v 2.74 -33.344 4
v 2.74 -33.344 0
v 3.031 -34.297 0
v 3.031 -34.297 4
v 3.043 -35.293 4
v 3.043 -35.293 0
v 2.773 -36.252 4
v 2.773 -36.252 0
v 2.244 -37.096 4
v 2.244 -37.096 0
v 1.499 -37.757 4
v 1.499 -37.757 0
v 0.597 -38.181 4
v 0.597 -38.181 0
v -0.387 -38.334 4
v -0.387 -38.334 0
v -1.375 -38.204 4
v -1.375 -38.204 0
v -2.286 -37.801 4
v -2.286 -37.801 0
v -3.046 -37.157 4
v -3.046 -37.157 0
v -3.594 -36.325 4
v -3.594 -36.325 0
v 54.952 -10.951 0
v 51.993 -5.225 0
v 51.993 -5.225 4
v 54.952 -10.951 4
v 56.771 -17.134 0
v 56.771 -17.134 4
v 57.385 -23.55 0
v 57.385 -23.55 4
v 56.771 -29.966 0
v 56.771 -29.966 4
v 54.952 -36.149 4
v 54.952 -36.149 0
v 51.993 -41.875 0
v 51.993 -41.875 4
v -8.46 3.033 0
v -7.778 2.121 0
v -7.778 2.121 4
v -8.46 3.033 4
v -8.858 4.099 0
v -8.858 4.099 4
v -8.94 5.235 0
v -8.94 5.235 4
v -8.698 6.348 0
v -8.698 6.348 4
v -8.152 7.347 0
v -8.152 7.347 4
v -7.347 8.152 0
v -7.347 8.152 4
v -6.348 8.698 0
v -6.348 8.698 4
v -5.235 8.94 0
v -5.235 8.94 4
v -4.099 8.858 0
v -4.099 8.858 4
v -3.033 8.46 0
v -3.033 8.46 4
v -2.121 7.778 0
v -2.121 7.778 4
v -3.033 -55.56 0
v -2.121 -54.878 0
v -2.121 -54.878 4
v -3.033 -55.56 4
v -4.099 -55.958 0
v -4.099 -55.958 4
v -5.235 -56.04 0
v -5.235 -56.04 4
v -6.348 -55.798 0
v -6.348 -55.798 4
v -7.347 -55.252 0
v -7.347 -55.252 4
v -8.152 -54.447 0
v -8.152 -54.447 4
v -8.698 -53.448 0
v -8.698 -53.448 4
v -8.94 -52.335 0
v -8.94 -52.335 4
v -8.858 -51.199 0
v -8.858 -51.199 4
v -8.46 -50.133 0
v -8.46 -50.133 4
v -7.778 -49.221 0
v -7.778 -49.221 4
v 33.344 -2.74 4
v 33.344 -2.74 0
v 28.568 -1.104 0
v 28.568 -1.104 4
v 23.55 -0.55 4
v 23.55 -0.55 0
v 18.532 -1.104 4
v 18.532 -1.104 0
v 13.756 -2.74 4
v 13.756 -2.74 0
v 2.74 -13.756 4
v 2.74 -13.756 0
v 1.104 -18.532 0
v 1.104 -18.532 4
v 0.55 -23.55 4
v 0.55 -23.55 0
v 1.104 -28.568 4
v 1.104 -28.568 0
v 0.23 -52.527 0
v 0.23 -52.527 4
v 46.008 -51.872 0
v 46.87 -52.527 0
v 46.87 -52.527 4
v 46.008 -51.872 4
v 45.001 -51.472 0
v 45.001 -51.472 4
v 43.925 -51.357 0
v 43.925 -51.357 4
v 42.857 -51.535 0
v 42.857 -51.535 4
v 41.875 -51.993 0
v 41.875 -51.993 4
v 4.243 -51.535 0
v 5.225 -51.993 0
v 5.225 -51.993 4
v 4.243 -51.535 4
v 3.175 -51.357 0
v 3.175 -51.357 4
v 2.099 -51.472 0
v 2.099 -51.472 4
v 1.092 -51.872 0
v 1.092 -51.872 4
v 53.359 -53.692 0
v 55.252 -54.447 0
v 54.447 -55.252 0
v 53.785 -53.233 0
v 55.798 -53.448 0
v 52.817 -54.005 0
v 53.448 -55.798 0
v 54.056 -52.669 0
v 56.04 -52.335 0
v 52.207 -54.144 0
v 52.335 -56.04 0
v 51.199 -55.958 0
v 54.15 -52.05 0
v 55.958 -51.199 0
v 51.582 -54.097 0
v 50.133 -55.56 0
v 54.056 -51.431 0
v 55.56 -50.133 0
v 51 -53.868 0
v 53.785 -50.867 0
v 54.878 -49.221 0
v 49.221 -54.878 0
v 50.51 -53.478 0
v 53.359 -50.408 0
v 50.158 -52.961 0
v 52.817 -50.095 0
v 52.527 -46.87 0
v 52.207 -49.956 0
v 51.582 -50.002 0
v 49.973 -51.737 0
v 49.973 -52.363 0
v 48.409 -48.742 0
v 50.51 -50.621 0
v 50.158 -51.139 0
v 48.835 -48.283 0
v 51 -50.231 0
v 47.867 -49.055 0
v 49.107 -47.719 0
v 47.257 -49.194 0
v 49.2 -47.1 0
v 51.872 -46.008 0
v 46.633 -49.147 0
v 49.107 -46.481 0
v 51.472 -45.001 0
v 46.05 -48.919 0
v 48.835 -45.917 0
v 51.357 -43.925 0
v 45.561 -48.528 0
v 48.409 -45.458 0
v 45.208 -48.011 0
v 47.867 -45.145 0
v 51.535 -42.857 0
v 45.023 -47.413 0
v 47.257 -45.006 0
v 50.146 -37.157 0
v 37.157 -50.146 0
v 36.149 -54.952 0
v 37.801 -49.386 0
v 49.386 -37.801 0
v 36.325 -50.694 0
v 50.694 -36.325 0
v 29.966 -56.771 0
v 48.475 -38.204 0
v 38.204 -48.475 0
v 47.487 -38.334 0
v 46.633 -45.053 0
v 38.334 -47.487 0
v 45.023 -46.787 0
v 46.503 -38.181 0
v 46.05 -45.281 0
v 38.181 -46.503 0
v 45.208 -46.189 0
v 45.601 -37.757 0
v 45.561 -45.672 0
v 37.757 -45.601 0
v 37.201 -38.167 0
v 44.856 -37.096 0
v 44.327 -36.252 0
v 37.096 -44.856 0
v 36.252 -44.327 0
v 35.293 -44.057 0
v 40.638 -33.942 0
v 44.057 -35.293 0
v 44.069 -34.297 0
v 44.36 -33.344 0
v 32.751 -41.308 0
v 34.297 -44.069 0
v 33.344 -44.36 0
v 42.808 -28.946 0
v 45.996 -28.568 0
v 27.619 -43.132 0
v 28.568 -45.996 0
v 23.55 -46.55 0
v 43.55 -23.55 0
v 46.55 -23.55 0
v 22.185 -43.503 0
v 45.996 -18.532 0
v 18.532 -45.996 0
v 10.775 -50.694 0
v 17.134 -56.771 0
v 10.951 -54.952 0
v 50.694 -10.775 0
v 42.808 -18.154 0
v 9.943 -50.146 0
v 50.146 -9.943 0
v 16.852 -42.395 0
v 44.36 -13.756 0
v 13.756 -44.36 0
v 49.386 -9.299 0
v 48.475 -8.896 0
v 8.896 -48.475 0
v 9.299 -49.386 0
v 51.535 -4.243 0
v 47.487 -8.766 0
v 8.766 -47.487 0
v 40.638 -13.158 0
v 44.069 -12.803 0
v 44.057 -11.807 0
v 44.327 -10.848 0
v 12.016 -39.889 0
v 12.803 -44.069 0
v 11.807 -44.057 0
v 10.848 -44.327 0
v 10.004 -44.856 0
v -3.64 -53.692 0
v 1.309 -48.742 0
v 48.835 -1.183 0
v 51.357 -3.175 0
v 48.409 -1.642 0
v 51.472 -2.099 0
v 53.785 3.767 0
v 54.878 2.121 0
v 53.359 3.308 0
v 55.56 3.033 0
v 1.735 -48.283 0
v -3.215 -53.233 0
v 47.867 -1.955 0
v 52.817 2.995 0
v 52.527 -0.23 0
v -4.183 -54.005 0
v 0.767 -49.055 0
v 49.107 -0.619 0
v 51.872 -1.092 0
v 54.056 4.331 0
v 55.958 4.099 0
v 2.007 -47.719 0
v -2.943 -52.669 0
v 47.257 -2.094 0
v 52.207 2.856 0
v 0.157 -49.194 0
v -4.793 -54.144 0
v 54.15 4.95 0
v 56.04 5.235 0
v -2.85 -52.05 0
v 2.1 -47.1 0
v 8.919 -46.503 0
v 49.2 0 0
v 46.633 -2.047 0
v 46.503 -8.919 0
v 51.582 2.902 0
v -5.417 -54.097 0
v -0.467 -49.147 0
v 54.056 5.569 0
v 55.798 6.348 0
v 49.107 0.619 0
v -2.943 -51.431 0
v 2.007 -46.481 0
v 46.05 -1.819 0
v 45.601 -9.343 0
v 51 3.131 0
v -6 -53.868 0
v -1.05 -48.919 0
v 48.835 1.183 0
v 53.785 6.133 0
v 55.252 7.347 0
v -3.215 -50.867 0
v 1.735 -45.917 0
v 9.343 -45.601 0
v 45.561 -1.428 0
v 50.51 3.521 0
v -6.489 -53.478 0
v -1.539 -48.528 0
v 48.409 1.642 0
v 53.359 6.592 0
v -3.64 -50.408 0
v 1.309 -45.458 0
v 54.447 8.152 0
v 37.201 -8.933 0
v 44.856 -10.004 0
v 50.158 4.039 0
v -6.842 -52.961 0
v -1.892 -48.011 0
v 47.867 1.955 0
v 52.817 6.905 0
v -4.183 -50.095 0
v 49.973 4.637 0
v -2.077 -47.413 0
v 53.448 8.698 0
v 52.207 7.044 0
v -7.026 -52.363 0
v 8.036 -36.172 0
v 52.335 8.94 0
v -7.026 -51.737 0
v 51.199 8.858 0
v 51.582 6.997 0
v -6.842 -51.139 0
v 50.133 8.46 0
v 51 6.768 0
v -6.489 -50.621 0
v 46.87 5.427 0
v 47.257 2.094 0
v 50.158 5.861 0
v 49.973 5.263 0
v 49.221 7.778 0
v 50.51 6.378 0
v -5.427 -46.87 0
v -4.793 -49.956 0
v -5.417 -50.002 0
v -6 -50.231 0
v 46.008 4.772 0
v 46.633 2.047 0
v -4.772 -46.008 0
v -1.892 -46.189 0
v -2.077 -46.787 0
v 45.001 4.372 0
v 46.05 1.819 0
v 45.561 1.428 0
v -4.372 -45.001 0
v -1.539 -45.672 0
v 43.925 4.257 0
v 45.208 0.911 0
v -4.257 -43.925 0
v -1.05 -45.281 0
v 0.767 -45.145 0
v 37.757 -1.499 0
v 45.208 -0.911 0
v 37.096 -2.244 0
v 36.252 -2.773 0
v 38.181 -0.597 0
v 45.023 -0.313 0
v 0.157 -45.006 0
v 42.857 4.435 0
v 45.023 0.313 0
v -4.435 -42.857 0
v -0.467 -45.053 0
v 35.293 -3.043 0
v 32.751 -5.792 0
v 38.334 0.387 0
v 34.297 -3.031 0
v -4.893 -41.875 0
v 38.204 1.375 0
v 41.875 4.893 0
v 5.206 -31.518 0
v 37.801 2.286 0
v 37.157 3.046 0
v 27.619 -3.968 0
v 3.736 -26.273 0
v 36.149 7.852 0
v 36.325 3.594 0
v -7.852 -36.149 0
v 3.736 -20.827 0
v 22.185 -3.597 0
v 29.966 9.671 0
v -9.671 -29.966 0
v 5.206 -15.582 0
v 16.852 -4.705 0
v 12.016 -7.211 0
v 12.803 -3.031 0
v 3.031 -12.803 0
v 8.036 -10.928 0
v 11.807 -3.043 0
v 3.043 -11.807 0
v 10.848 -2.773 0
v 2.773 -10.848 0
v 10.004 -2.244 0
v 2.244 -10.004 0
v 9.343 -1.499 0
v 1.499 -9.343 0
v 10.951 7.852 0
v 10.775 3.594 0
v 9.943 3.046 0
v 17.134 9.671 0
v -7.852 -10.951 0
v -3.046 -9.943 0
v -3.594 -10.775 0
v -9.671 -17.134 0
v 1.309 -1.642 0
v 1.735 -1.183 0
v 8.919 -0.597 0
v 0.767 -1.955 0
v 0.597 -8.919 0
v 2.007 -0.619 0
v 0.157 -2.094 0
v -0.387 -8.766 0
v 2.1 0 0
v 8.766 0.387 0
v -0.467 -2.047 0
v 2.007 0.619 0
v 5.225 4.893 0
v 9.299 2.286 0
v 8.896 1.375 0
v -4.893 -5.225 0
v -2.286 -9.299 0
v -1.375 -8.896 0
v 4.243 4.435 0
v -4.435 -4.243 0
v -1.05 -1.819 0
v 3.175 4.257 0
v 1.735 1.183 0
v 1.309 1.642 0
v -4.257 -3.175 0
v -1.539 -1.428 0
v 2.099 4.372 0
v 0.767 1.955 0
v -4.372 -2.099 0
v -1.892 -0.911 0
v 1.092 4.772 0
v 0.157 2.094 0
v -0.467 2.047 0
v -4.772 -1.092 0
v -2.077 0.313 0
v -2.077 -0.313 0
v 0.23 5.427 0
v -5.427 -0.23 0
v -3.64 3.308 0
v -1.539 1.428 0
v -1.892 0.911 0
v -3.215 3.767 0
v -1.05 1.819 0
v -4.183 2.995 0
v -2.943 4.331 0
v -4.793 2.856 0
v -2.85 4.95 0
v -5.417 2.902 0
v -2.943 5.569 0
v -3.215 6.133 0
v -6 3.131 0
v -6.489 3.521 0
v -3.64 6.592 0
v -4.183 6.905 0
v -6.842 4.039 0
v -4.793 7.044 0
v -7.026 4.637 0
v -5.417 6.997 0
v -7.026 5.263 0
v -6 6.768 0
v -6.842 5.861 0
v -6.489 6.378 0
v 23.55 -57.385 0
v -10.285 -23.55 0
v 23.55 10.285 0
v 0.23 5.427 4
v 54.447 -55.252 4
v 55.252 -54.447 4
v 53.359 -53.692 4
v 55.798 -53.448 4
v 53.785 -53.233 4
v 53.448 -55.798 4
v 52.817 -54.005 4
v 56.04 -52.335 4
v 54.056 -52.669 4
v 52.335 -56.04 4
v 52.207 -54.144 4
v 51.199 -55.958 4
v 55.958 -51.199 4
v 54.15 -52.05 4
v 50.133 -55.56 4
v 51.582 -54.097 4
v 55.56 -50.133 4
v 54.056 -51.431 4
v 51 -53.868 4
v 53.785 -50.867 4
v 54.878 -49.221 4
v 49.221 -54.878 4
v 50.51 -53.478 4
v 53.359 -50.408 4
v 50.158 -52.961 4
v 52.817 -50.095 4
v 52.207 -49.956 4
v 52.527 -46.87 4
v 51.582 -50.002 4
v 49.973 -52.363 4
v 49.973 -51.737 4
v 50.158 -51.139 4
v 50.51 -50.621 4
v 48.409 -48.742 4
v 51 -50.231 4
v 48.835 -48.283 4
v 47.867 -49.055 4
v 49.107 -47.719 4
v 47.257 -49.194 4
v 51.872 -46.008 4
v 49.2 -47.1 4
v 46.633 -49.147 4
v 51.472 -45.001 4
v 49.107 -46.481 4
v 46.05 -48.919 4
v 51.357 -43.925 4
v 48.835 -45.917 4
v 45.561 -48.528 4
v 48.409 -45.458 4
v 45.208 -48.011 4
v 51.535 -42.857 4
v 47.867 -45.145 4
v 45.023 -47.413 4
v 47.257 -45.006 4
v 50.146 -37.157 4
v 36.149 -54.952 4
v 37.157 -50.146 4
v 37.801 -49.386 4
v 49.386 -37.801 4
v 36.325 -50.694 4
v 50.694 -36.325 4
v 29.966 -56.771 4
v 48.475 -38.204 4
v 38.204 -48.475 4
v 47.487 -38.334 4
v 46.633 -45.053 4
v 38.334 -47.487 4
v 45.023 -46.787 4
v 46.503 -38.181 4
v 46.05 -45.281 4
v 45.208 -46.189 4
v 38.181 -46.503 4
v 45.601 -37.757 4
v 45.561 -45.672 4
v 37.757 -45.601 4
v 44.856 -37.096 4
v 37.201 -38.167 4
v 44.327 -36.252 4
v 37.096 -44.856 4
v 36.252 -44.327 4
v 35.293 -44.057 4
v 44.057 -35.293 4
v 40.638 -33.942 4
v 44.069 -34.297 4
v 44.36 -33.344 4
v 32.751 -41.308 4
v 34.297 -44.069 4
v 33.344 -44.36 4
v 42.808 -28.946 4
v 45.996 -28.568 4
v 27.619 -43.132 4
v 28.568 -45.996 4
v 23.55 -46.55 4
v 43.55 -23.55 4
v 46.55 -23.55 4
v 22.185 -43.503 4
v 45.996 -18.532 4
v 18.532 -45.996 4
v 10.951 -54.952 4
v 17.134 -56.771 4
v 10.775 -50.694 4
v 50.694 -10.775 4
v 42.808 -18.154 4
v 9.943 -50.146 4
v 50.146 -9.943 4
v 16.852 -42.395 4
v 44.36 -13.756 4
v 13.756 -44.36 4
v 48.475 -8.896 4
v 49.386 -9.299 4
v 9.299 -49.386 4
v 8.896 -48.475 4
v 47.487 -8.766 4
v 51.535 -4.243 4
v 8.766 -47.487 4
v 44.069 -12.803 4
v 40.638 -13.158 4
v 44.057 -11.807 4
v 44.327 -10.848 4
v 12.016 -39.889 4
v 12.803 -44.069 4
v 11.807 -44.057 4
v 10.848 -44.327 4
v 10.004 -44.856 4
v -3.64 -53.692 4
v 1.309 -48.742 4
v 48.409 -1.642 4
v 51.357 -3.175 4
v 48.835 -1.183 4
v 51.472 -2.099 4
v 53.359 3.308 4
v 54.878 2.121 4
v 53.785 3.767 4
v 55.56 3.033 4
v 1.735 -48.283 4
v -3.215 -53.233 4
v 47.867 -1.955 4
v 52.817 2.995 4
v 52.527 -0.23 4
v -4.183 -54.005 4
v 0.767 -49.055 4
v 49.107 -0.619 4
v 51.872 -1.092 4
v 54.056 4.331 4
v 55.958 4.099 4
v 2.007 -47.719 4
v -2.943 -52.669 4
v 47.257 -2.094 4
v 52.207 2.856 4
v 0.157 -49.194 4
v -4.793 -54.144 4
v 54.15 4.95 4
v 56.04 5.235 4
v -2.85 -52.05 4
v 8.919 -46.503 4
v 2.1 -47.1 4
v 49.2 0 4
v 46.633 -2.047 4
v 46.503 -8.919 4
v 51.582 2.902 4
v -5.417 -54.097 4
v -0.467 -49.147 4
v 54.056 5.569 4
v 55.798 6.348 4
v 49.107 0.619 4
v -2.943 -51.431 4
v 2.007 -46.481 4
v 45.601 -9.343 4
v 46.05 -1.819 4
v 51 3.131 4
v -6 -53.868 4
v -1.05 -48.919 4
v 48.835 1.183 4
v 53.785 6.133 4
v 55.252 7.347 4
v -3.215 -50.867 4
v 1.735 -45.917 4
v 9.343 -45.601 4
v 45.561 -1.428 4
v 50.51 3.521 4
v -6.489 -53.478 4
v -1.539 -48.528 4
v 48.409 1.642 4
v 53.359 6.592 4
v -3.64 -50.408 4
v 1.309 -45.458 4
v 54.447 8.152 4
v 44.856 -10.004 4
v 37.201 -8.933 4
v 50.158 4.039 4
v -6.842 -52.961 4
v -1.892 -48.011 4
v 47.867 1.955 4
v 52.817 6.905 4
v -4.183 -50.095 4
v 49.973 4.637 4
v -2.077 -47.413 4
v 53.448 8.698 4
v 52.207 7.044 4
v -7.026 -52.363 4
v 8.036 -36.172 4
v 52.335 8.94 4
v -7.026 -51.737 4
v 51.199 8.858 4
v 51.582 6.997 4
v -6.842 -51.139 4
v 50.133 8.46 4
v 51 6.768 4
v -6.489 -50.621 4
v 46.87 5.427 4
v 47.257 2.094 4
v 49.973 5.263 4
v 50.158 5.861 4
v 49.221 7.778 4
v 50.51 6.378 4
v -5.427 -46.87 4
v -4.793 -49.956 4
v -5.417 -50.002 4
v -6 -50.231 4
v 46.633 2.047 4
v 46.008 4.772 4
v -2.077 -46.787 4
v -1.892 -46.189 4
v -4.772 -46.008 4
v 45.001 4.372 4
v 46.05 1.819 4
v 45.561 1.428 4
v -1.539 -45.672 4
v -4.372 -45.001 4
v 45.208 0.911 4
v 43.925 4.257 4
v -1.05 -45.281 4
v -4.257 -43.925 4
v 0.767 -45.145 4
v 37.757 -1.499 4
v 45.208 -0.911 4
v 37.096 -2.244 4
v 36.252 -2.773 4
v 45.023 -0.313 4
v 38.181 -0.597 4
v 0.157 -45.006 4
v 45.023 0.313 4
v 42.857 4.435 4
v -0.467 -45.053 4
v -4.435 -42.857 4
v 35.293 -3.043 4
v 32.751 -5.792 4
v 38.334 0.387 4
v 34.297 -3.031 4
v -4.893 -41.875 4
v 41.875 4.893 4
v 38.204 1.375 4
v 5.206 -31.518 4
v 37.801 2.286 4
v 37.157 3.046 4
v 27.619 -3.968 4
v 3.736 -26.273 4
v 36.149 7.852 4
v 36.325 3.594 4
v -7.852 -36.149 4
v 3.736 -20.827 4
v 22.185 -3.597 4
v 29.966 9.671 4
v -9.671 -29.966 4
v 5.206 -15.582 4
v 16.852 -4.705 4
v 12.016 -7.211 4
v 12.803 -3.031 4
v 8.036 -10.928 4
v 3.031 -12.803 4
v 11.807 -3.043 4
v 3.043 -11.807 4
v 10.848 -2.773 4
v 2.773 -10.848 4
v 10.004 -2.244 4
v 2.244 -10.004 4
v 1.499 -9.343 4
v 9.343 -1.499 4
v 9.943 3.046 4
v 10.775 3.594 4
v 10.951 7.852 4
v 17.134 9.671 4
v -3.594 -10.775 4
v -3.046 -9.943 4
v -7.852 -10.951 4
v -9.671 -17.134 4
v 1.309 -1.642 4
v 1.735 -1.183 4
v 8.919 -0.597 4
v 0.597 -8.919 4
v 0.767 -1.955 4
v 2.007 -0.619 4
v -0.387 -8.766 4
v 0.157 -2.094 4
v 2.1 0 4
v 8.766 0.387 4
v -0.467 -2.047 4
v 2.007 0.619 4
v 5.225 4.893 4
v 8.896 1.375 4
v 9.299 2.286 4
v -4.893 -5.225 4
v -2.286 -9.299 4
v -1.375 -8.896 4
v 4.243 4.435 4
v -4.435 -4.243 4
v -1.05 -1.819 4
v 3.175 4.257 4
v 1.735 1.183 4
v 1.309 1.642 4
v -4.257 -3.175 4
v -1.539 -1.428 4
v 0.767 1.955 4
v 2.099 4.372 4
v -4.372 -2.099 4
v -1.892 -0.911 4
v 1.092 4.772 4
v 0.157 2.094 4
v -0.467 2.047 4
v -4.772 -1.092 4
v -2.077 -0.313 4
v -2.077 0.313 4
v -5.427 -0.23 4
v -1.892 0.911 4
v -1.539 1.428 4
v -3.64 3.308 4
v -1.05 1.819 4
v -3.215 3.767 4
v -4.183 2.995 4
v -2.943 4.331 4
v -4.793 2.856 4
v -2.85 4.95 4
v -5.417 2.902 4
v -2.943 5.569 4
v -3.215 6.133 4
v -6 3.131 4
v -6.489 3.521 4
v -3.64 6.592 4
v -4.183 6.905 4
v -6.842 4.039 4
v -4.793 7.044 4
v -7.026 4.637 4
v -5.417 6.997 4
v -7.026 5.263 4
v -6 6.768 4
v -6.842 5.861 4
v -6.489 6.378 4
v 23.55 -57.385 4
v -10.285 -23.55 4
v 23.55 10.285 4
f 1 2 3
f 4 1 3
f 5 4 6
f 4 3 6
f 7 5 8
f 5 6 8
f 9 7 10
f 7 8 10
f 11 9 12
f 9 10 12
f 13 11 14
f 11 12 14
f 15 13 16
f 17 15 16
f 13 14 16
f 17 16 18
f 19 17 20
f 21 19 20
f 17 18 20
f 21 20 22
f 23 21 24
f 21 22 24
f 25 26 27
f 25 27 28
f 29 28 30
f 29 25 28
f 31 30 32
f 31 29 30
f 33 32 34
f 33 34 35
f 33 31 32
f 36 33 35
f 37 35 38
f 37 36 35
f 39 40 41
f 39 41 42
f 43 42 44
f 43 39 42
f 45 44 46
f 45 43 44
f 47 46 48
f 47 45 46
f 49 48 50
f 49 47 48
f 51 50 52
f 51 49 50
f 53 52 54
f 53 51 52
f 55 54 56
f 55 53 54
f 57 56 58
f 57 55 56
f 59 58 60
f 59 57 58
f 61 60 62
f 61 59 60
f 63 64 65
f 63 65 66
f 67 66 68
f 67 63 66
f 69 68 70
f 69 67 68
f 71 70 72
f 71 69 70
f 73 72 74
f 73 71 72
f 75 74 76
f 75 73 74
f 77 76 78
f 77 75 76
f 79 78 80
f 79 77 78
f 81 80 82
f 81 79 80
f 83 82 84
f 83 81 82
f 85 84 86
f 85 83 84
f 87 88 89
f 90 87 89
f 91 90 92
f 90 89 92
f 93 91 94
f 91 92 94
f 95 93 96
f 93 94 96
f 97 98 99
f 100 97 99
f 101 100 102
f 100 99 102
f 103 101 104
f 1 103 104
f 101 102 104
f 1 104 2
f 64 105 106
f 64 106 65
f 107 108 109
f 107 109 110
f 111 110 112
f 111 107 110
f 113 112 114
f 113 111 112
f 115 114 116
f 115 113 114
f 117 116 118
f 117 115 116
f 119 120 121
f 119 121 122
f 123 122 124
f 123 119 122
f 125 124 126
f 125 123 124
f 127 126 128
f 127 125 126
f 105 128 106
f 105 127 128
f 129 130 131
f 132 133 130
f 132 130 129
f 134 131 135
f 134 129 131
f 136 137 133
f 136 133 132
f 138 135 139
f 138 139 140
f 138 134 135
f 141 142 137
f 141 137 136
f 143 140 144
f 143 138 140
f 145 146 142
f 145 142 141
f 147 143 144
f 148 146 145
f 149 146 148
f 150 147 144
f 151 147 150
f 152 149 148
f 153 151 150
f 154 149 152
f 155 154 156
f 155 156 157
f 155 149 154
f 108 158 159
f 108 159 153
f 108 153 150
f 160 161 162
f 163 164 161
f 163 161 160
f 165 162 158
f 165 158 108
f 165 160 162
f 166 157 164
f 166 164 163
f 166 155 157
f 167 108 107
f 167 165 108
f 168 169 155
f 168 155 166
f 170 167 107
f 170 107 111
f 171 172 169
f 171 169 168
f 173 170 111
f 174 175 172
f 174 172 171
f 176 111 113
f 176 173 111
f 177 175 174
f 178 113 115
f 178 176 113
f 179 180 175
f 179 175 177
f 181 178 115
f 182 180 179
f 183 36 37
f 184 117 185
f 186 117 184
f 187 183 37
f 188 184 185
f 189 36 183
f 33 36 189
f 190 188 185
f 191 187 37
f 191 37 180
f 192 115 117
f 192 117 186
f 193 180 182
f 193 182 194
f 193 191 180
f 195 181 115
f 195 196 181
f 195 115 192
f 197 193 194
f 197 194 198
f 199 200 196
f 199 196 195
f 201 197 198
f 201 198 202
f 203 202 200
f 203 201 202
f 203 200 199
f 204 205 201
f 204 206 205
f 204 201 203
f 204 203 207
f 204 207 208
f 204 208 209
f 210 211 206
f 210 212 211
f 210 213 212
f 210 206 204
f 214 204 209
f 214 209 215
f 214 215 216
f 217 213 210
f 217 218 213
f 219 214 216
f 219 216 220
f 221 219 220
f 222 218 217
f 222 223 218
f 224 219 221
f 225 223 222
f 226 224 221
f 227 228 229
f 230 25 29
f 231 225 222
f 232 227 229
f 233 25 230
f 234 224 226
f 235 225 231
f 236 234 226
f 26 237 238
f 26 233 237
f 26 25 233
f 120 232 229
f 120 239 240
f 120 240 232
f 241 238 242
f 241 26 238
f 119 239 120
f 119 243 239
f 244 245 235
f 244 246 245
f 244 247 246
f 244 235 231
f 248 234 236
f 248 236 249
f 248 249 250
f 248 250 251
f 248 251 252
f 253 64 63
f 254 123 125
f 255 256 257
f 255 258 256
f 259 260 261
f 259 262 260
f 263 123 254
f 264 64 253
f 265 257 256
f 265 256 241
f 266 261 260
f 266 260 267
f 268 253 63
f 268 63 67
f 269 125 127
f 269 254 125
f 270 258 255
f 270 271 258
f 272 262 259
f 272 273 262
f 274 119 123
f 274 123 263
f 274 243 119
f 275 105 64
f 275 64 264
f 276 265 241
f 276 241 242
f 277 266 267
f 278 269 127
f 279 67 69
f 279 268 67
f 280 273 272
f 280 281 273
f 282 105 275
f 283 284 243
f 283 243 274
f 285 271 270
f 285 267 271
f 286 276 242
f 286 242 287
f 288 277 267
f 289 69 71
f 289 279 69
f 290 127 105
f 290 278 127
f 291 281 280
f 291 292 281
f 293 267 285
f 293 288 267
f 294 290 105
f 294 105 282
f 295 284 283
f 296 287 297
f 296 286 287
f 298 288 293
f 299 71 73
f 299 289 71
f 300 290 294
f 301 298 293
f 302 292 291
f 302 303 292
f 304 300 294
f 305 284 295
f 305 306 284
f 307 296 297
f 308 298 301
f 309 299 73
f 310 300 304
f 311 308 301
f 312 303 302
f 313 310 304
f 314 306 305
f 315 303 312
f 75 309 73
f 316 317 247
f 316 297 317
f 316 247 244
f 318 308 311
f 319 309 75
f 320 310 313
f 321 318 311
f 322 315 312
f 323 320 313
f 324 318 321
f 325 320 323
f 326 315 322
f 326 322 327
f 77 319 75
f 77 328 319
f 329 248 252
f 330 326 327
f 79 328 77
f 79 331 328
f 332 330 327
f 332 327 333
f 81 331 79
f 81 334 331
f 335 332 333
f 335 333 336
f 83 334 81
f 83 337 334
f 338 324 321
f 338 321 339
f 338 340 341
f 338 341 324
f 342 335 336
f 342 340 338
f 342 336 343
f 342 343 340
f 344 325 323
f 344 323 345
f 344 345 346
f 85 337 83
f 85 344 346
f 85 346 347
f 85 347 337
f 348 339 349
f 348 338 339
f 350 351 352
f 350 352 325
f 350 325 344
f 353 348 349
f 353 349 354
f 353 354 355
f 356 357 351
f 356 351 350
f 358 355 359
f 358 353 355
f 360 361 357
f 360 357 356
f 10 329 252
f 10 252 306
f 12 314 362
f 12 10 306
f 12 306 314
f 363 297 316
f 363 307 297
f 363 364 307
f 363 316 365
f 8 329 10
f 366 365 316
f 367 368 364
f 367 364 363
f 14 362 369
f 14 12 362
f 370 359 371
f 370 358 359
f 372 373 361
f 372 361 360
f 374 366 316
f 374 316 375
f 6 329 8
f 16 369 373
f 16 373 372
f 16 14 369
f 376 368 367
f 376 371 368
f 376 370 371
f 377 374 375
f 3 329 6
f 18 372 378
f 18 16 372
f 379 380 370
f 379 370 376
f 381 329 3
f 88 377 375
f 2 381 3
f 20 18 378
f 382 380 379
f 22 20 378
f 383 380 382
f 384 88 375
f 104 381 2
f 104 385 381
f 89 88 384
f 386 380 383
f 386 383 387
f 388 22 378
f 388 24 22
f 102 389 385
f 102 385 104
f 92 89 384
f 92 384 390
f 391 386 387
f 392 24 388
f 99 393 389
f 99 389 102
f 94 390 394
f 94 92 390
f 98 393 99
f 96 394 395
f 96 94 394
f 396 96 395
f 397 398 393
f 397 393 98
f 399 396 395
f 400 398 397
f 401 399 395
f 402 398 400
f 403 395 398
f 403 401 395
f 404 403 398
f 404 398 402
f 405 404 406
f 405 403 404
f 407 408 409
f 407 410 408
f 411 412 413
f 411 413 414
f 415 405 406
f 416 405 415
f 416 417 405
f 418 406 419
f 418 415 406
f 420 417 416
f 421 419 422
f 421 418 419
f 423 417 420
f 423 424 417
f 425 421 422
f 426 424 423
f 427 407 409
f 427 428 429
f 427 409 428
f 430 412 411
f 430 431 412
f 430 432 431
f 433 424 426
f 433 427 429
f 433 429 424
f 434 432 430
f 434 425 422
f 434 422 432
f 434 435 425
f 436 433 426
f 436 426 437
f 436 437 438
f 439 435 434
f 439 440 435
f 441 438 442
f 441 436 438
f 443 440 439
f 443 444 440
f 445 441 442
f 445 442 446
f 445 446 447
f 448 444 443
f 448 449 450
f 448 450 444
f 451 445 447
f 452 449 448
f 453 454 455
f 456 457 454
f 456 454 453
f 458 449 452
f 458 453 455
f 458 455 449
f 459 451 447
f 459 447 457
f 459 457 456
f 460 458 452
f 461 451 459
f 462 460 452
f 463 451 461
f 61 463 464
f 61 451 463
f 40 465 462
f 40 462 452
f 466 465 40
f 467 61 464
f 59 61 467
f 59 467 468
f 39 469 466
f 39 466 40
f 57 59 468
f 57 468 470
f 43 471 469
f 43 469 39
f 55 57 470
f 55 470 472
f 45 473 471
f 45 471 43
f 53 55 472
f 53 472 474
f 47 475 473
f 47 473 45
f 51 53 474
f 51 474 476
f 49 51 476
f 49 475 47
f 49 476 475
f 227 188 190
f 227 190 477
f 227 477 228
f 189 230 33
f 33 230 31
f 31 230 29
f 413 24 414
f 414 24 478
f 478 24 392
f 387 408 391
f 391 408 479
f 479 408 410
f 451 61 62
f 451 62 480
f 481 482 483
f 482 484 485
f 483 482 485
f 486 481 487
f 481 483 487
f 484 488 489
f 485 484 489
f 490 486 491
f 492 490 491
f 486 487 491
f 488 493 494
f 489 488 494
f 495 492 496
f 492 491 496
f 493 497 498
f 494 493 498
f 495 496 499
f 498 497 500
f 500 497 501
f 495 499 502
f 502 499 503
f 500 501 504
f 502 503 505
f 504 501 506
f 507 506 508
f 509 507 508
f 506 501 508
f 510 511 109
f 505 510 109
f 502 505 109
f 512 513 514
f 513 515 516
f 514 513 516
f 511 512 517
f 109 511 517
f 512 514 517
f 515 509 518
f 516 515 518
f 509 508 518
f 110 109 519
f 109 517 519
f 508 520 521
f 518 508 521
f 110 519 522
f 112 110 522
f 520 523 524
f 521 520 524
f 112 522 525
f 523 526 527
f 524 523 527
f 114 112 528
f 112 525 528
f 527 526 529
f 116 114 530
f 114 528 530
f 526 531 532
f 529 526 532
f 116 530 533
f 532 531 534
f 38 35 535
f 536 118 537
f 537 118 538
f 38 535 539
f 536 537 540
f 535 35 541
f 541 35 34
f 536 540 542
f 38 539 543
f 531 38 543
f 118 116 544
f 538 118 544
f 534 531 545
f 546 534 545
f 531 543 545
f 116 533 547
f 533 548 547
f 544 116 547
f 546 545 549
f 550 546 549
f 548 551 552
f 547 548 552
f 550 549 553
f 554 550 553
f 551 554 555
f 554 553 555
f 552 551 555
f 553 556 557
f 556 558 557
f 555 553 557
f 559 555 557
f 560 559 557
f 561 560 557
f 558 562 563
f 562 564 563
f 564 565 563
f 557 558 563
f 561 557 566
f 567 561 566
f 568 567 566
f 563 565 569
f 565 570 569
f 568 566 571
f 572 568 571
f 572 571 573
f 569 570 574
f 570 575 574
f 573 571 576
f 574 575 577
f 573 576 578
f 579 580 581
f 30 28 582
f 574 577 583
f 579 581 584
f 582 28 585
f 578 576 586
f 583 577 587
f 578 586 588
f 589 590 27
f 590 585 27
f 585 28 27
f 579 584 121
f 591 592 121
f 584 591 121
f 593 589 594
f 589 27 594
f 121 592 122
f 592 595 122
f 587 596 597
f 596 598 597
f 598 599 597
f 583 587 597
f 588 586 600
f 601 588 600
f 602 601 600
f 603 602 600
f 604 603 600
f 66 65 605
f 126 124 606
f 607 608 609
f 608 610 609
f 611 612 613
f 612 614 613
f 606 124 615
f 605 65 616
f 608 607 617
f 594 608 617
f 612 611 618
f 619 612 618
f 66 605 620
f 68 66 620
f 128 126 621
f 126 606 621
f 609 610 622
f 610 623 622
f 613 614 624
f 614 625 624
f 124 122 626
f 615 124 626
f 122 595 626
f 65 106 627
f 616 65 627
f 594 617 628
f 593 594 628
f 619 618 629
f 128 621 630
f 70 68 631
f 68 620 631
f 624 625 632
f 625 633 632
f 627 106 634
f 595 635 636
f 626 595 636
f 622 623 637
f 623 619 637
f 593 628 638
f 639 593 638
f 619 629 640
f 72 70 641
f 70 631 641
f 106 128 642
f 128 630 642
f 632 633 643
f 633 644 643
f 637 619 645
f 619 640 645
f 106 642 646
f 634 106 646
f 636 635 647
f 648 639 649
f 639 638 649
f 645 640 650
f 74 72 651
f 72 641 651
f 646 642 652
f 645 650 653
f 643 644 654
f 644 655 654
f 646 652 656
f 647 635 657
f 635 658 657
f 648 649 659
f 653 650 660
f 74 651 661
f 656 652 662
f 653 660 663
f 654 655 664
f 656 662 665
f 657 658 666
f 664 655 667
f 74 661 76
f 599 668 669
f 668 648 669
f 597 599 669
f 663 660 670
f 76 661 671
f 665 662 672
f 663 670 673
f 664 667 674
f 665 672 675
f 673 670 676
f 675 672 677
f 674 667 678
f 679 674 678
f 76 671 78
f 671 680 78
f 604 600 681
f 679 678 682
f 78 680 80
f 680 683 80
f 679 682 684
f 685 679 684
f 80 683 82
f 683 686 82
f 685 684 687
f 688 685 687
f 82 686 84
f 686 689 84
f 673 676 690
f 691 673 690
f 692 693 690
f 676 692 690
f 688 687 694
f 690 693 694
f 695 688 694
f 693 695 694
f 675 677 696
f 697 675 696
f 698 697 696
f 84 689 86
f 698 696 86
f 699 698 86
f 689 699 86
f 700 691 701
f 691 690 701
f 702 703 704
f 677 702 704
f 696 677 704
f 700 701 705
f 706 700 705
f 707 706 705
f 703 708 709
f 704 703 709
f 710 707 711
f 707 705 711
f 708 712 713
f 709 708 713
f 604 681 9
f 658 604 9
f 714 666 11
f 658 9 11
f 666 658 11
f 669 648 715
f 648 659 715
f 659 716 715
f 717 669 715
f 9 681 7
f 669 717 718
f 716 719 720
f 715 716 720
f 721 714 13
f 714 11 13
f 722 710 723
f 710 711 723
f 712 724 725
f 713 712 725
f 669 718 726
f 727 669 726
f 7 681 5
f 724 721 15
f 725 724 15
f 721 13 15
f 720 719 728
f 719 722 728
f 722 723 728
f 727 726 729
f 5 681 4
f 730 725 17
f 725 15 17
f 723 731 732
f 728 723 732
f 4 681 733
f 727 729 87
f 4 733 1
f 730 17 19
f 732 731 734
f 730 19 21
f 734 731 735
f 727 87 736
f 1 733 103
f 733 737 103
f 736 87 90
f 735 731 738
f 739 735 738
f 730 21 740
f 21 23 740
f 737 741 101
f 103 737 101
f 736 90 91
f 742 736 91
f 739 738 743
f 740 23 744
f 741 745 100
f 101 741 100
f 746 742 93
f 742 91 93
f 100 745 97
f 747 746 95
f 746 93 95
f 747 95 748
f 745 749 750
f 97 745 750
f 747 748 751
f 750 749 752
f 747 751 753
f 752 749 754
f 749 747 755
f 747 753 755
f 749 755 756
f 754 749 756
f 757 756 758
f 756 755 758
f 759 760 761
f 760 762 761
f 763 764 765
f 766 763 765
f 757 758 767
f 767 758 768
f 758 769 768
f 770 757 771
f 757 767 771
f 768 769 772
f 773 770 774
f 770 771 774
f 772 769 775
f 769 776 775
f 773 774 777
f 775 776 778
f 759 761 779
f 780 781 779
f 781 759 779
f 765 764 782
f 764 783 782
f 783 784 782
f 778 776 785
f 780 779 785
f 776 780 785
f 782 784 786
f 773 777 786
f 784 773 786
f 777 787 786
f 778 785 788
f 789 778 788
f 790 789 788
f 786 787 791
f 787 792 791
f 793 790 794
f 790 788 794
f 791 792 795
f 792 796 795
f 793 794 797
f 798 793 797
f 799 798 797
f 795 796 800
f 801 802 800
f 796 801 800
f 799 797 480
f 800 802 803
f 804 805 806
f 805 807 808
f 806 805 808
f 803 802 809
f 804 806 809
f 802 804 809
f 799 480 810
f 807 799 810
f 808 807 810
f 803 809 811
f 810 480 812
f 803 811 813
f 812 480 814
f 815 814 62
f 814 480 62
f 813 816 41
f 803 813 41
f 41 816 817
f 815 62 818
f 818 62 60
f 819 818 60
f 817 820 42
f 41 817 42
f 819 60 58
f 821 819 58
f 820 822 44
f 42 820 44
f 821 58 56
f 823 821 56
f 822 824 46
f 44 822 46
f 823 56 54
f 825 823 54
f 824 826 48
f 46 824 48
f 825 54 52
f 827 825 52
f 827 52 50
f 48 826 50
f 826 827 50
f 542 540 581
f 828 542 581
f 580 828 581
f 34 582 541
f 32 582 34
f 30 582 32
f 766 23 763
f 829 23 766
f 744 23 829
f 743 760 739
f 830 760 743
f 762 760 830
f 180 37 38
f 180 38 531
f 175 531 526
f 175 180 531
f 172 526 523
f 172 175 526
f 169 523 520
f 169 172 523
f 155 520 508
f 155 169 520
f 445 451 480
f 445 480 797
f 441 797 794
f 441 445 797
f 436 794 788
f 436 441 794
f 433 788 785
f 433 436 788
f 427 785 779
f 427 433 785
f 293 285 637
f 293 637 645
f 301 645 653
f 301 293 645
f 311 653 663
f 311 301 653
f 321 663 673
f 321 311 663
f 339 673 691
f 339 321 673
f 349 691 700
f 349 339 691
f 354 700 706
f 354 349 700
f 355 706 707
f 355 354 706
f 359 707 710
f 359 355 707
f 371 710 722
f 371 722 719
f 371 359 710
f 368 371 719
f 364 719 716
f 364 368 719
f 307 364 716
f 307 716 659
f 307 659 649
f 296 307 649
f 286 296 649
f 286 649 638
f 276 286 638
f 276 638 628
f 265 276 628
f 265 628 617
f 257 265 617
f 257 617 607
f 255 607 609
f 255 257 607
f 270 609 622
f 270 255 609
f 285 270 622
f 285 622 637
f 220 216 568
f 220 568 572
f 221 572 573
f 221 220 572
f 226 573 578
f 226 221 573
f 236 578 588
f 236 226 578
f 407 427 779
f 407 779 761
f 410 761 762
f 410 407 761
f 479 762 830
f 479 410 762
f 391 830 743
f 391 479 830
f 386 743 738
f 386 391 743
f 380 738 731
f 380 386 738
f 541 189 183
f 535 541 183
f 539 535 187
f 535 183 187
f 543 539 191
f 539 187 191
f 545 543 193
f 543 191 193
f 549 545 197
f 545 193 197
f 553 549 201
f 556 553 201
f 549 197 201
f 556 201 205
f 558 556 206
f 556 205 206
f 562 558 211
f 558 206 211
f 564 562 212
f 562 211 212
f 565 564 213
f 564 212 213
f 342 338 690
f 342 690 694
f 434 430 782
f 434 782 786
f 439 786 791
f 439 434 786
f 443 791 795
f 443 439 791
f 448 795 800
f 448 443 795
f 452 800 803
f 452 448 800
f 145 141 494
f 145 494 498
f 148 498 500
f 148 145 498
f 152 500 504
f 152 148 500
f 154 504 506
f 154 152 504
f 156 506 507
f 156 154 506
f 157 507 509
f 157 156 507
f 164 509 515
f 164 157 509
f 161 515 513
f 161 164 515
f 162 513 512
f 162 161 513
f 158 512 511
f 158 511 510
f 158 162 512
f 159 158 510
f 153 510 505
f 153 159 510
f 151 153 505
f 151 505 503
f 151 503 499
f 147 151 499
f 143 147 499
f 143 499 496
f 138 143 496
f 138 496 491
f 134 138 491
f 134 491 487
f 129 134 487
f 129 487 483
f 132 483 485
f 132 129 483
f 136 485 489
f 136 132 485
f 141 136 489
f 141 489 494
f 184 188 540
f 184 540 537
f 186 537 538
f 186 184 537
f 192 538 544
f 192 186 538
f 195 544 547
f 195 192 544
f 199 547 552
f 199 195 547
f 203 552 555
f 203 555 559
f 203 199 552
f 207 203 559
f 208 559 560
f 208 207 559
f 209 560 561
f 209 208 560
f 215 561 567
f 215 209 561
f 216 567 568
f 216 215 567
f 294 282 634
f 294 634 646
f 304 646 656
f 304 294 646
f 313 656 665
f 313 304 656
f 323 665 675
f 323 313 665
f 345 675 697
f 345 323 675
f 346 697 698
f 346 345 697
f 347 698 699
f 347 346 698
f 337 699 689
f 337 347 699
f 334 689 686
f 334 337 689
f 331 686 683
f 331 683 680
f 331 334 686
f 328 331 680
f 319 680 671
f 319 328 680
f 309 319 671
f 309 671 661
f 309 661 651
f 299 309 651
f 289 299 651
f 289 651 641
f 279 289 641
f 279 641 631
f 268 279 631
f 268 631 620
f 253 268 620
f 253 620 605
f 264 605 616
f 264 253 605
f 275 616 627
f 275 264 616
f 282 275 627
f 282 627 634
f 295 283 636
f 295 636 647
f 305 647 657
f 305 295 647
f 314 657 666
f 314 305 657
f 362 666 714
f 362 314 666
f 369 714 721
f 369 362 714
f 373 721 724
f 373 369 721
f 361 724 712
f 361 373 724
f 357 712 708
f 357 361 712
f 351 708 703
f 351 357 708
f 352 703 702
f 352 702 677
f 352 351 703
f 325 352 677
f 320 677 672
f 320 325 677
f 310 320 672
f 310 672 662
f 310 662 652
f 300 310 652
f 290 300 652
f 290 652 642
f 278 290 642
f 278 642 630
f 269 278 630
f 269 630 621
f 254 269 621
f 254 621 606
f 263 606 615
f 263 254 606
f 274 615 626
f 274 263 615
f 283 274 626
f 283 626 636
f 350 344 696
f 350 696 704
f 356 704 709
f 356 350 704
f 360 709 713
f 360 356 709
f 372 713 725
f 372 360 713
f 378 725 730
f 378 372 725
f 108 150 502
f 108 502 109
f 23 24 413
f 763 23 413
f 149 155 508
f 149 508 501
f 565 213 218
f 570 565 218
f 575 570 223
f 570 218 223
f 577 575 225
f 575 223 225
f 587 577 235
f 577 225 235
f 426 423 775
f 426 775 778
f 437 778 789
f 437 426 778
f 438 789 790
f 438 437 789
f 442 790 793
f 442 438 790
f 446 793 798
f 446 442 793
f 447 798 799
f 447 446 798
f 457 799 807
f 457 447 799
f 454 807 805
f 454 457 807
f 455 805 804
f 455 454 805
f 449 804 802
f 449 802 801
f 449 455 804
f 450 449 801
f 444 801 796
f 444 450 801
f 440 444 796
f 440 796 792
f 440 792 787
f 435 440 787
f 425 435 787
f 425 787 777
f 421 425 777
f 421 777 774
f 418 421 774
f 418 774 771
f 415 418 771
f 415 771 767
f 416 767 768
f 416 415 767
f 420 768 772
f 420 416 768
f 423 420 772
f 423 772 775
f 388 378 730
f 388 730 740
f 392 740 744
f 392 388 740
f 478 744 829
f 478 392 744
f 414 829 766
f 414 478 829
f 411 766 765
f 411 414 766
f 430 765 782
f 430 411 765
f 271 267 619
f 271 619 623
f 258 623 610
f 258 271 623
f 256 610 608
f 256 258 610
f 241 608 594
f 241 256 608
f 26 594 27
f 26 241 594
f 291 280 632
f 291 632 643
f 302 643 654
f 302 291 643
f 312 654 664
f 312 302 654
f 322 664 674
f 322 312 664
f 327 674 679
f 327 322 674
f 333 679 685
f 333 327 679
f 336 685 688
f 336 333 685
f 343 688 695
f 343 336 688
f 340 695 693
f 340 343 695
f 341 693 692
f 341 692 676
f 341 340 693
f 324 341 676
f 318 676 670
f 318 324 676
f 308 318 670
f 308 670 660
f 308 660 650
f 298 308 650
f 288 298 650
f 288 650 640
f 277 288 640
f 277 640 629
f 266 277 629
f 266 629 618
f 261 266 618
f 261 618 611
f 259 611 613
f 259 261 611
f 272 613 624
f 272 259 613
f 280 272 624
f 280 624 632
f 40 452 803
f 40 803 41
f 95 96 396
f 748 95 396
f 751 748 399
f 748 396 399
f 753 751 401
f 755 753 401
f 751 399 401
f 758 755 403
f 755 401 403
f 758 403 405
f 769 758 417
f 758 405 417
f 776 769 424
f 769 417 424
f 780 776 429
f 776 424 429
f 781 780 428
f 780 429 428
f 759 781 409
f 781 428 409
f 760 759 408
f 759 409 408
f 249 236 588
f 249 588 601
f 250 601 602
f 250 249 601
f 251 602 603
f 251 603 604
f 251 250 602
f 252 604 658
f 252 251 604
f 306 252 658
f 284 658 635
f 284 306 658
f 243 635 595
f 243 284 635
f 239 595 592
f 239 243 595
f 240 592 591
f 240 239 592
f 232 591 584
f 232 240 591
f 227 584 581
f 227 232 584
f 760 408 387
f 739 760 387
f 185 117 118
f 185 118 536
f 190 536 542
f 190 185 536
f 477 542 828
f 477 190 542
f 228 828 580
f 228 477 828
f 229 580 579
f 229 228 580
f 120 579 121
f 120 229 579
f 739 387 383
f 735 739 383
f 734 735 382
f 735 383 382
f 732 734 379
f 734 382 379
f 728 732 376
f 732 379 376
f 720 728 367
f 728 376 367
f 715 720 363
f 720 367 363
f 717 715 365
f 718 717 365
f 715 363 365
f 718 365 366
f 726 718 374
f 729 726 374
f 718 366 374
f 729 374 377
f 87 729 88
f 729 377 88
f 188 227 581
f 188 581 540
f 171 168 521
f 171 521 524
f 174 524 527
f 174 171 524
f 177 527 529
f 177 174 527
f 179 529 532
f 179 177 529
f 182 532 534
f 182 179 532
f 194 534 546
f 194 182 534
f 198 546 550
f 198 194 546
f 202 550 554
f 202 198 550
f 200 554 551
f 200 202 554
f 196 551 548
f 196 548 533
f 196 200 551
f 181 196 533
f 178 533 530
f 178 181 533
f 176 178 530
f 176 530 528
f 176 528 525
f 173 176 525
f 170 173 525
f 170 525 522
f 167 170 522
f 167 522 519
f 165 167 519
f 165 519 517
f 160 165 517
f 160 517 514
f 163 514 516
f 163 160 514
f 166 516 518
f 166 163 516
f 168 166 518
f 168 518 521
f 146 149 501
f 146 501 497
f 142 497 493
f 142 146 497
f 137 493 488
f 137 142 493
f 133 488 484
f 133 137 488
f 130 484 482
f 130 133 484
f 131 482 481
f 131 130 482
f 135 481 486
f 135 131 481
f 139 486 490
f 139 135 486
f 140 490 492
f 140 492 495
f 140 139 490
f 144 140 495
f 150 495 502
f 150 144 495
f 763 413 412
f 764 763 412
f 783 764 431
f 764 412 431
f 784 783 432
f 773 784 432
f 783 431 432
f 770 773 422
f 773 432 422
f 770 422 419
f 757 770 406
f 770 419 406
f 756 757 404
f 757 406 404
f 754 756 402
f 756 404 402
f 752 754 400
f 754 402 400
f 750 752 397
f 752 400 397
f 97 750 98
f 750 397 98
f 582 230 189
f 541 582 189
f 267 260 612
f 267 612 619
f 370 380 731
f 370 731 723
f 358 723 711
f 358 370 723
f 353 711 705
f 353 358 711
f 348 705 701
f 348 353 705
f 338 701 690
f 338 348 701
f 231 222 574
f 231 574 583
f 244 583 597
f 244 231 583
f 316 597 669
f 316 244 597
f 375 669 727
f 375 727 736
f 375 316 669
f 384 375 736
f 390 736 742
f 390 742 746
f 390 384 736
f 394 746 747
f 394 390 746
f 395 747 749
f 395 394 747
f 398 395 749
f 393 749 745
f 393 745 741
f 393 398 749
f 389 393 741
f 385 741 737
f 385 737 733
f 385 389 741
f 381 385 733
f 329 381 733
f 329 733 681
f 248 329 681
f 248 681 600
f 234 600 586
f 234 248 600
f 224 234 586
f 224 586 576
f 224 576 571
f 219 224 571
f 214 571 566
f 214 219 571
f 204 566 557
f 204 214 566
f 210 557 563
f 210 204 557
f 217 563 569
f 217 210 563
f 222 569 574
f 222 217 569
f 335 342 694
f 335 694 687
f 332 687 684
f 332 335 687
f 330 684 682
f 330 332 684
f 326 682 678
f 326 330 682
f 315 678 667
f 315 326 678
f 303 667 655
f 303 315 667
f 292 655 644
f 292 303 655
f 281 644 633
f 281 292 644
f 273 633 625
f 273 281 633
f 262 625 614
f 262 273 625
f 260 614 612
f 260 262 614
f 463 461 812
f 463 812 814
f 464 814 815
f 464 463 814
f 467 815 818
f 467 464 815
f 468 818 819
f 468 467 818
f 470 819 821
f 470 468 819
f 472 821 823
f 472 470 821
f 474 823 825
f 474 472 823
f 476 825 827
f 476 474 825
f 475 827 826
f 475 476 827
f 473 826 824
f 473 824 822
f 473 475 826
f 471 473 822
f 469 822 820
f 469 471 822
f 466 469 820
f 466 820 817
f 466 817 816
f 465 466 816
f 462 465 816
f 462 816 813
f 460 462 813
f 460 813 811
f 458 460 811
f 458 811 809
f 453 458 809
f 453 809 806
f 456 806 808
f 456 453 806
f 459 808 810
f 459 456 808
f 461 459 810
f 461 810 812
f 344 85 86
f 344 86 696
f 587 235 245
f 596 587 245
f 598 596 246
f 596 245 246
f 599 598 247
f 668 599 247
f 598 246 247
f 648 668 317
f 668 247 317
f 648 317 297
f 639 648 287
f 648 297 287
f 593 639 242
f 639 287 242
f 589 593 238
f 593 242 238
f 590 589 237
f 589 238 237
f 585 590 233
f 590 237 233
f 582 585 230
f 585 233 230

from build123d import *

# Parameters (mm, degrees)
SKETCH_1_R      = 2.1
SKETCH_1_R_2    = 20
EXTRUDE_1_DEPTH = 4


with BuildPart() as part:
    # 草图1 → 凸台-拉伸1 (new body)
    with BuildSketch(Plane.XY):
        with BuildLine():
            Line((49.221320344, -54.878174593), (46.870064467, -52.526918716))
            ThreePointArc((46.870064467, -52.526918716), (44.466937039, -51.378020085), (41.875216056, -51.992814233))
            ThreePointArc((41.875216056, -51.992814233), (23.55, -57.385), (5.224783944, -51.992814233))
            ThreePointArc((5.224783944, -51.992814233), (2.633062961, -51.378020085), (0.229935533, -52.526918716))
            Line((0.229935533, -52.526918716), (-2.121320344, -54.878174593))
            ThreePointArc((-2.121320344, -54.878174593), (-7.778174593, -54.878174593), (-7.778174593, -49.221320343))
            Line((-7.778174593, -49.221320343), (-5.426918716, -46.870064467))
            ThreePointArc((-5.426918716, -46.870064467), (-4.278020085, -44.466937039), (-4.892814234, -41.875216055))
            ThreePointArc((-4.892814234, -41.875216055), (-10.285, -23.55), (-4.892814233, -5.224783944))
            ThreePointArc((-4.892814233, -5.224783944), (-4.278020085, -2.633062961), (-5.426918716, -0.229935533))
            Line((-5.426918716, -0.229935533), (-7.778174593, 2.121320344))
            ThreePointArc((-7.778174593, 2.121320344), (-7.778174593, 7.778174593), (-2.121320343, 7.778174593))
            Line((-2.121320343, 7.778174593), (0.229935534, 5.426918716))
            ThreePointArc((0.229935534, 5.426918716), (2.633062961, 4.278020085), (5.224783945, 4.892814234))
            ThreePointArc((5.224783945, 4.892814234), (23.55, 10.285), (41.875216056, 4.892814233))
            ThreePointArc((41.875216056, 4.892814233), (44.466937039, 4.278020085), (46.870064467, 5.426918716))
            Line((46.870064467, 5.426918716), (49.221320344, 7.778174593))
            ThreePointArc((49.221320344, 7.778174593), (54.878174593, 7.778174593), (54.878174593, 2.121320344))
            Line((54.878174593, 2.121320344), (52.526918716, -0.229935533))
            ThreePointArc((52.526918716, -0.229935533), (51.378020085, -2.633062961), (51.992814234, -5.224783945))
            ThreePointArc((51.992814234, -5.224783945), (57.385, -23.55), (51.992814233, -41.875216056))
            ThreePointArc((51.992814233, -41.875216056), (51.378020085, -44.466937039), (52.526918716, -46.870064467))
            Line((52.526918716, -46.870064467), (54.878174593, -49.221320344))
            ThreePointArc((54.878174593, -49.221320344), (54.878174593, -54.878174593), (49.221320344, -54.878174593))
        make_face()
        with Locations((47.1, -47.1)):
            Circle(SKETCH_1_R, mode=Mode.SUBTRACT)
        with Locations((23.55, -23.55)):
            Circle(SKETCH_1_R_2, mode=Mode.SUBTRACT)
        with Locations((52.049747468, -52.049747468)):
            Circle(SKETCH_1_R, mode=Mode.SUBTRACT)
        with Locations((-4.949747468, -52.049747468)):
            Circle(SKETCH_1_R, mode=Mode.SUBTRACT)
        with Locations((-4.949747468, 4.949747468)):
            Circle(SKETCH_1_R, mode=Mode.SUBTRACT)
        with Locations((52.049747468, 4.949747468)):
            Circle(SKETCH_1_R, mode=Mode.SUBTRACT)
        with Locations((0, -47.1)):
            Circle(SKETCH_1_R, mode=Mode.SUBTRACT)
        Circle(SKETCH_1_R, mode=Mode.SUBTRACT)
        with Locations((47.1, 0)):
            Circle(SKETCH_1_R, mode=Mode.SUBTRACT)
        with BuildLine():
            Line((10.774989316, 3.594043583), (36.325010684, 3.594043583))
            ThreePointArc((36.325010684, 3.594043583), (38.001397856, -1.063179415), (33.344174858, -2.739566587))
            ThreePointArc((33.344174858, -2.739566587), (23.55, -0.55), (13.755825142, -2.739566587))
            ThreePointArc((13.755825142, -2.739566587), (9.098602144, -1.063179415), (10.774989316, 3.594043583))
        make_face(mode=Mode.SUBTRACT)
        with BuildLine():
            Line((-3.594043583, -36.325010684), (-3.594043583, -10.774989316))
            ThreePointArc((-3.594043583, -10.774989316), (1.063179415, -9.098602144), (2.739566587, -13.755825142))
            ThreePointArc((2.739566587, -13.755825142), (0.55, -23.55), (2.739566587, -33.344174858))
            ThreePointArc((2.739566587, -33.344174858), (1.063179415, -38.001397856), (-3.594043583, -36.325010684))
        make_face(mode=Mode.SUBTRACT)
        with BuildLine():
            Line((10.774989316, -50.694043583), (36.325010684, -50.694043583))
            ThreePointArc((36.325010684, -50.694043583), (38.001397856, -46.036820585), (33.344174858, -44.360433413))
            ThreePointArc((33.344174858, -44.360433413), (23.55, -46.55), (13.755825142, -44.360433413))
            ThreePointArc((13.755825142, -44.360433413), (9.098602144, -46.036820585), (10.774989316, -50.694043583))
        make_face(mode=Mode.SUBTRACT)
        with BuildLine():
            Line((50.694043583, -10.774989316), (50.694043583, -36.325010684))
            ThreePointArc((50.694043583, -36.325010684), (46.036820585, -38.001397856), (44.360433413, -33.344174858))
            ThreePointArc((44.360433413, -33.344174858), (46.55, -23.55), (44.360433413, -13.755825142))
            ThreePointArc((44.360433413, -13.755825142), (46.036820585, -9.098602144), (50.694043583, -10.774989316))
        make_face(mode=Mode.SUBTRACT)
    extrude(amount=EXTRUDE_1_DEPTH)


solid = part.part
